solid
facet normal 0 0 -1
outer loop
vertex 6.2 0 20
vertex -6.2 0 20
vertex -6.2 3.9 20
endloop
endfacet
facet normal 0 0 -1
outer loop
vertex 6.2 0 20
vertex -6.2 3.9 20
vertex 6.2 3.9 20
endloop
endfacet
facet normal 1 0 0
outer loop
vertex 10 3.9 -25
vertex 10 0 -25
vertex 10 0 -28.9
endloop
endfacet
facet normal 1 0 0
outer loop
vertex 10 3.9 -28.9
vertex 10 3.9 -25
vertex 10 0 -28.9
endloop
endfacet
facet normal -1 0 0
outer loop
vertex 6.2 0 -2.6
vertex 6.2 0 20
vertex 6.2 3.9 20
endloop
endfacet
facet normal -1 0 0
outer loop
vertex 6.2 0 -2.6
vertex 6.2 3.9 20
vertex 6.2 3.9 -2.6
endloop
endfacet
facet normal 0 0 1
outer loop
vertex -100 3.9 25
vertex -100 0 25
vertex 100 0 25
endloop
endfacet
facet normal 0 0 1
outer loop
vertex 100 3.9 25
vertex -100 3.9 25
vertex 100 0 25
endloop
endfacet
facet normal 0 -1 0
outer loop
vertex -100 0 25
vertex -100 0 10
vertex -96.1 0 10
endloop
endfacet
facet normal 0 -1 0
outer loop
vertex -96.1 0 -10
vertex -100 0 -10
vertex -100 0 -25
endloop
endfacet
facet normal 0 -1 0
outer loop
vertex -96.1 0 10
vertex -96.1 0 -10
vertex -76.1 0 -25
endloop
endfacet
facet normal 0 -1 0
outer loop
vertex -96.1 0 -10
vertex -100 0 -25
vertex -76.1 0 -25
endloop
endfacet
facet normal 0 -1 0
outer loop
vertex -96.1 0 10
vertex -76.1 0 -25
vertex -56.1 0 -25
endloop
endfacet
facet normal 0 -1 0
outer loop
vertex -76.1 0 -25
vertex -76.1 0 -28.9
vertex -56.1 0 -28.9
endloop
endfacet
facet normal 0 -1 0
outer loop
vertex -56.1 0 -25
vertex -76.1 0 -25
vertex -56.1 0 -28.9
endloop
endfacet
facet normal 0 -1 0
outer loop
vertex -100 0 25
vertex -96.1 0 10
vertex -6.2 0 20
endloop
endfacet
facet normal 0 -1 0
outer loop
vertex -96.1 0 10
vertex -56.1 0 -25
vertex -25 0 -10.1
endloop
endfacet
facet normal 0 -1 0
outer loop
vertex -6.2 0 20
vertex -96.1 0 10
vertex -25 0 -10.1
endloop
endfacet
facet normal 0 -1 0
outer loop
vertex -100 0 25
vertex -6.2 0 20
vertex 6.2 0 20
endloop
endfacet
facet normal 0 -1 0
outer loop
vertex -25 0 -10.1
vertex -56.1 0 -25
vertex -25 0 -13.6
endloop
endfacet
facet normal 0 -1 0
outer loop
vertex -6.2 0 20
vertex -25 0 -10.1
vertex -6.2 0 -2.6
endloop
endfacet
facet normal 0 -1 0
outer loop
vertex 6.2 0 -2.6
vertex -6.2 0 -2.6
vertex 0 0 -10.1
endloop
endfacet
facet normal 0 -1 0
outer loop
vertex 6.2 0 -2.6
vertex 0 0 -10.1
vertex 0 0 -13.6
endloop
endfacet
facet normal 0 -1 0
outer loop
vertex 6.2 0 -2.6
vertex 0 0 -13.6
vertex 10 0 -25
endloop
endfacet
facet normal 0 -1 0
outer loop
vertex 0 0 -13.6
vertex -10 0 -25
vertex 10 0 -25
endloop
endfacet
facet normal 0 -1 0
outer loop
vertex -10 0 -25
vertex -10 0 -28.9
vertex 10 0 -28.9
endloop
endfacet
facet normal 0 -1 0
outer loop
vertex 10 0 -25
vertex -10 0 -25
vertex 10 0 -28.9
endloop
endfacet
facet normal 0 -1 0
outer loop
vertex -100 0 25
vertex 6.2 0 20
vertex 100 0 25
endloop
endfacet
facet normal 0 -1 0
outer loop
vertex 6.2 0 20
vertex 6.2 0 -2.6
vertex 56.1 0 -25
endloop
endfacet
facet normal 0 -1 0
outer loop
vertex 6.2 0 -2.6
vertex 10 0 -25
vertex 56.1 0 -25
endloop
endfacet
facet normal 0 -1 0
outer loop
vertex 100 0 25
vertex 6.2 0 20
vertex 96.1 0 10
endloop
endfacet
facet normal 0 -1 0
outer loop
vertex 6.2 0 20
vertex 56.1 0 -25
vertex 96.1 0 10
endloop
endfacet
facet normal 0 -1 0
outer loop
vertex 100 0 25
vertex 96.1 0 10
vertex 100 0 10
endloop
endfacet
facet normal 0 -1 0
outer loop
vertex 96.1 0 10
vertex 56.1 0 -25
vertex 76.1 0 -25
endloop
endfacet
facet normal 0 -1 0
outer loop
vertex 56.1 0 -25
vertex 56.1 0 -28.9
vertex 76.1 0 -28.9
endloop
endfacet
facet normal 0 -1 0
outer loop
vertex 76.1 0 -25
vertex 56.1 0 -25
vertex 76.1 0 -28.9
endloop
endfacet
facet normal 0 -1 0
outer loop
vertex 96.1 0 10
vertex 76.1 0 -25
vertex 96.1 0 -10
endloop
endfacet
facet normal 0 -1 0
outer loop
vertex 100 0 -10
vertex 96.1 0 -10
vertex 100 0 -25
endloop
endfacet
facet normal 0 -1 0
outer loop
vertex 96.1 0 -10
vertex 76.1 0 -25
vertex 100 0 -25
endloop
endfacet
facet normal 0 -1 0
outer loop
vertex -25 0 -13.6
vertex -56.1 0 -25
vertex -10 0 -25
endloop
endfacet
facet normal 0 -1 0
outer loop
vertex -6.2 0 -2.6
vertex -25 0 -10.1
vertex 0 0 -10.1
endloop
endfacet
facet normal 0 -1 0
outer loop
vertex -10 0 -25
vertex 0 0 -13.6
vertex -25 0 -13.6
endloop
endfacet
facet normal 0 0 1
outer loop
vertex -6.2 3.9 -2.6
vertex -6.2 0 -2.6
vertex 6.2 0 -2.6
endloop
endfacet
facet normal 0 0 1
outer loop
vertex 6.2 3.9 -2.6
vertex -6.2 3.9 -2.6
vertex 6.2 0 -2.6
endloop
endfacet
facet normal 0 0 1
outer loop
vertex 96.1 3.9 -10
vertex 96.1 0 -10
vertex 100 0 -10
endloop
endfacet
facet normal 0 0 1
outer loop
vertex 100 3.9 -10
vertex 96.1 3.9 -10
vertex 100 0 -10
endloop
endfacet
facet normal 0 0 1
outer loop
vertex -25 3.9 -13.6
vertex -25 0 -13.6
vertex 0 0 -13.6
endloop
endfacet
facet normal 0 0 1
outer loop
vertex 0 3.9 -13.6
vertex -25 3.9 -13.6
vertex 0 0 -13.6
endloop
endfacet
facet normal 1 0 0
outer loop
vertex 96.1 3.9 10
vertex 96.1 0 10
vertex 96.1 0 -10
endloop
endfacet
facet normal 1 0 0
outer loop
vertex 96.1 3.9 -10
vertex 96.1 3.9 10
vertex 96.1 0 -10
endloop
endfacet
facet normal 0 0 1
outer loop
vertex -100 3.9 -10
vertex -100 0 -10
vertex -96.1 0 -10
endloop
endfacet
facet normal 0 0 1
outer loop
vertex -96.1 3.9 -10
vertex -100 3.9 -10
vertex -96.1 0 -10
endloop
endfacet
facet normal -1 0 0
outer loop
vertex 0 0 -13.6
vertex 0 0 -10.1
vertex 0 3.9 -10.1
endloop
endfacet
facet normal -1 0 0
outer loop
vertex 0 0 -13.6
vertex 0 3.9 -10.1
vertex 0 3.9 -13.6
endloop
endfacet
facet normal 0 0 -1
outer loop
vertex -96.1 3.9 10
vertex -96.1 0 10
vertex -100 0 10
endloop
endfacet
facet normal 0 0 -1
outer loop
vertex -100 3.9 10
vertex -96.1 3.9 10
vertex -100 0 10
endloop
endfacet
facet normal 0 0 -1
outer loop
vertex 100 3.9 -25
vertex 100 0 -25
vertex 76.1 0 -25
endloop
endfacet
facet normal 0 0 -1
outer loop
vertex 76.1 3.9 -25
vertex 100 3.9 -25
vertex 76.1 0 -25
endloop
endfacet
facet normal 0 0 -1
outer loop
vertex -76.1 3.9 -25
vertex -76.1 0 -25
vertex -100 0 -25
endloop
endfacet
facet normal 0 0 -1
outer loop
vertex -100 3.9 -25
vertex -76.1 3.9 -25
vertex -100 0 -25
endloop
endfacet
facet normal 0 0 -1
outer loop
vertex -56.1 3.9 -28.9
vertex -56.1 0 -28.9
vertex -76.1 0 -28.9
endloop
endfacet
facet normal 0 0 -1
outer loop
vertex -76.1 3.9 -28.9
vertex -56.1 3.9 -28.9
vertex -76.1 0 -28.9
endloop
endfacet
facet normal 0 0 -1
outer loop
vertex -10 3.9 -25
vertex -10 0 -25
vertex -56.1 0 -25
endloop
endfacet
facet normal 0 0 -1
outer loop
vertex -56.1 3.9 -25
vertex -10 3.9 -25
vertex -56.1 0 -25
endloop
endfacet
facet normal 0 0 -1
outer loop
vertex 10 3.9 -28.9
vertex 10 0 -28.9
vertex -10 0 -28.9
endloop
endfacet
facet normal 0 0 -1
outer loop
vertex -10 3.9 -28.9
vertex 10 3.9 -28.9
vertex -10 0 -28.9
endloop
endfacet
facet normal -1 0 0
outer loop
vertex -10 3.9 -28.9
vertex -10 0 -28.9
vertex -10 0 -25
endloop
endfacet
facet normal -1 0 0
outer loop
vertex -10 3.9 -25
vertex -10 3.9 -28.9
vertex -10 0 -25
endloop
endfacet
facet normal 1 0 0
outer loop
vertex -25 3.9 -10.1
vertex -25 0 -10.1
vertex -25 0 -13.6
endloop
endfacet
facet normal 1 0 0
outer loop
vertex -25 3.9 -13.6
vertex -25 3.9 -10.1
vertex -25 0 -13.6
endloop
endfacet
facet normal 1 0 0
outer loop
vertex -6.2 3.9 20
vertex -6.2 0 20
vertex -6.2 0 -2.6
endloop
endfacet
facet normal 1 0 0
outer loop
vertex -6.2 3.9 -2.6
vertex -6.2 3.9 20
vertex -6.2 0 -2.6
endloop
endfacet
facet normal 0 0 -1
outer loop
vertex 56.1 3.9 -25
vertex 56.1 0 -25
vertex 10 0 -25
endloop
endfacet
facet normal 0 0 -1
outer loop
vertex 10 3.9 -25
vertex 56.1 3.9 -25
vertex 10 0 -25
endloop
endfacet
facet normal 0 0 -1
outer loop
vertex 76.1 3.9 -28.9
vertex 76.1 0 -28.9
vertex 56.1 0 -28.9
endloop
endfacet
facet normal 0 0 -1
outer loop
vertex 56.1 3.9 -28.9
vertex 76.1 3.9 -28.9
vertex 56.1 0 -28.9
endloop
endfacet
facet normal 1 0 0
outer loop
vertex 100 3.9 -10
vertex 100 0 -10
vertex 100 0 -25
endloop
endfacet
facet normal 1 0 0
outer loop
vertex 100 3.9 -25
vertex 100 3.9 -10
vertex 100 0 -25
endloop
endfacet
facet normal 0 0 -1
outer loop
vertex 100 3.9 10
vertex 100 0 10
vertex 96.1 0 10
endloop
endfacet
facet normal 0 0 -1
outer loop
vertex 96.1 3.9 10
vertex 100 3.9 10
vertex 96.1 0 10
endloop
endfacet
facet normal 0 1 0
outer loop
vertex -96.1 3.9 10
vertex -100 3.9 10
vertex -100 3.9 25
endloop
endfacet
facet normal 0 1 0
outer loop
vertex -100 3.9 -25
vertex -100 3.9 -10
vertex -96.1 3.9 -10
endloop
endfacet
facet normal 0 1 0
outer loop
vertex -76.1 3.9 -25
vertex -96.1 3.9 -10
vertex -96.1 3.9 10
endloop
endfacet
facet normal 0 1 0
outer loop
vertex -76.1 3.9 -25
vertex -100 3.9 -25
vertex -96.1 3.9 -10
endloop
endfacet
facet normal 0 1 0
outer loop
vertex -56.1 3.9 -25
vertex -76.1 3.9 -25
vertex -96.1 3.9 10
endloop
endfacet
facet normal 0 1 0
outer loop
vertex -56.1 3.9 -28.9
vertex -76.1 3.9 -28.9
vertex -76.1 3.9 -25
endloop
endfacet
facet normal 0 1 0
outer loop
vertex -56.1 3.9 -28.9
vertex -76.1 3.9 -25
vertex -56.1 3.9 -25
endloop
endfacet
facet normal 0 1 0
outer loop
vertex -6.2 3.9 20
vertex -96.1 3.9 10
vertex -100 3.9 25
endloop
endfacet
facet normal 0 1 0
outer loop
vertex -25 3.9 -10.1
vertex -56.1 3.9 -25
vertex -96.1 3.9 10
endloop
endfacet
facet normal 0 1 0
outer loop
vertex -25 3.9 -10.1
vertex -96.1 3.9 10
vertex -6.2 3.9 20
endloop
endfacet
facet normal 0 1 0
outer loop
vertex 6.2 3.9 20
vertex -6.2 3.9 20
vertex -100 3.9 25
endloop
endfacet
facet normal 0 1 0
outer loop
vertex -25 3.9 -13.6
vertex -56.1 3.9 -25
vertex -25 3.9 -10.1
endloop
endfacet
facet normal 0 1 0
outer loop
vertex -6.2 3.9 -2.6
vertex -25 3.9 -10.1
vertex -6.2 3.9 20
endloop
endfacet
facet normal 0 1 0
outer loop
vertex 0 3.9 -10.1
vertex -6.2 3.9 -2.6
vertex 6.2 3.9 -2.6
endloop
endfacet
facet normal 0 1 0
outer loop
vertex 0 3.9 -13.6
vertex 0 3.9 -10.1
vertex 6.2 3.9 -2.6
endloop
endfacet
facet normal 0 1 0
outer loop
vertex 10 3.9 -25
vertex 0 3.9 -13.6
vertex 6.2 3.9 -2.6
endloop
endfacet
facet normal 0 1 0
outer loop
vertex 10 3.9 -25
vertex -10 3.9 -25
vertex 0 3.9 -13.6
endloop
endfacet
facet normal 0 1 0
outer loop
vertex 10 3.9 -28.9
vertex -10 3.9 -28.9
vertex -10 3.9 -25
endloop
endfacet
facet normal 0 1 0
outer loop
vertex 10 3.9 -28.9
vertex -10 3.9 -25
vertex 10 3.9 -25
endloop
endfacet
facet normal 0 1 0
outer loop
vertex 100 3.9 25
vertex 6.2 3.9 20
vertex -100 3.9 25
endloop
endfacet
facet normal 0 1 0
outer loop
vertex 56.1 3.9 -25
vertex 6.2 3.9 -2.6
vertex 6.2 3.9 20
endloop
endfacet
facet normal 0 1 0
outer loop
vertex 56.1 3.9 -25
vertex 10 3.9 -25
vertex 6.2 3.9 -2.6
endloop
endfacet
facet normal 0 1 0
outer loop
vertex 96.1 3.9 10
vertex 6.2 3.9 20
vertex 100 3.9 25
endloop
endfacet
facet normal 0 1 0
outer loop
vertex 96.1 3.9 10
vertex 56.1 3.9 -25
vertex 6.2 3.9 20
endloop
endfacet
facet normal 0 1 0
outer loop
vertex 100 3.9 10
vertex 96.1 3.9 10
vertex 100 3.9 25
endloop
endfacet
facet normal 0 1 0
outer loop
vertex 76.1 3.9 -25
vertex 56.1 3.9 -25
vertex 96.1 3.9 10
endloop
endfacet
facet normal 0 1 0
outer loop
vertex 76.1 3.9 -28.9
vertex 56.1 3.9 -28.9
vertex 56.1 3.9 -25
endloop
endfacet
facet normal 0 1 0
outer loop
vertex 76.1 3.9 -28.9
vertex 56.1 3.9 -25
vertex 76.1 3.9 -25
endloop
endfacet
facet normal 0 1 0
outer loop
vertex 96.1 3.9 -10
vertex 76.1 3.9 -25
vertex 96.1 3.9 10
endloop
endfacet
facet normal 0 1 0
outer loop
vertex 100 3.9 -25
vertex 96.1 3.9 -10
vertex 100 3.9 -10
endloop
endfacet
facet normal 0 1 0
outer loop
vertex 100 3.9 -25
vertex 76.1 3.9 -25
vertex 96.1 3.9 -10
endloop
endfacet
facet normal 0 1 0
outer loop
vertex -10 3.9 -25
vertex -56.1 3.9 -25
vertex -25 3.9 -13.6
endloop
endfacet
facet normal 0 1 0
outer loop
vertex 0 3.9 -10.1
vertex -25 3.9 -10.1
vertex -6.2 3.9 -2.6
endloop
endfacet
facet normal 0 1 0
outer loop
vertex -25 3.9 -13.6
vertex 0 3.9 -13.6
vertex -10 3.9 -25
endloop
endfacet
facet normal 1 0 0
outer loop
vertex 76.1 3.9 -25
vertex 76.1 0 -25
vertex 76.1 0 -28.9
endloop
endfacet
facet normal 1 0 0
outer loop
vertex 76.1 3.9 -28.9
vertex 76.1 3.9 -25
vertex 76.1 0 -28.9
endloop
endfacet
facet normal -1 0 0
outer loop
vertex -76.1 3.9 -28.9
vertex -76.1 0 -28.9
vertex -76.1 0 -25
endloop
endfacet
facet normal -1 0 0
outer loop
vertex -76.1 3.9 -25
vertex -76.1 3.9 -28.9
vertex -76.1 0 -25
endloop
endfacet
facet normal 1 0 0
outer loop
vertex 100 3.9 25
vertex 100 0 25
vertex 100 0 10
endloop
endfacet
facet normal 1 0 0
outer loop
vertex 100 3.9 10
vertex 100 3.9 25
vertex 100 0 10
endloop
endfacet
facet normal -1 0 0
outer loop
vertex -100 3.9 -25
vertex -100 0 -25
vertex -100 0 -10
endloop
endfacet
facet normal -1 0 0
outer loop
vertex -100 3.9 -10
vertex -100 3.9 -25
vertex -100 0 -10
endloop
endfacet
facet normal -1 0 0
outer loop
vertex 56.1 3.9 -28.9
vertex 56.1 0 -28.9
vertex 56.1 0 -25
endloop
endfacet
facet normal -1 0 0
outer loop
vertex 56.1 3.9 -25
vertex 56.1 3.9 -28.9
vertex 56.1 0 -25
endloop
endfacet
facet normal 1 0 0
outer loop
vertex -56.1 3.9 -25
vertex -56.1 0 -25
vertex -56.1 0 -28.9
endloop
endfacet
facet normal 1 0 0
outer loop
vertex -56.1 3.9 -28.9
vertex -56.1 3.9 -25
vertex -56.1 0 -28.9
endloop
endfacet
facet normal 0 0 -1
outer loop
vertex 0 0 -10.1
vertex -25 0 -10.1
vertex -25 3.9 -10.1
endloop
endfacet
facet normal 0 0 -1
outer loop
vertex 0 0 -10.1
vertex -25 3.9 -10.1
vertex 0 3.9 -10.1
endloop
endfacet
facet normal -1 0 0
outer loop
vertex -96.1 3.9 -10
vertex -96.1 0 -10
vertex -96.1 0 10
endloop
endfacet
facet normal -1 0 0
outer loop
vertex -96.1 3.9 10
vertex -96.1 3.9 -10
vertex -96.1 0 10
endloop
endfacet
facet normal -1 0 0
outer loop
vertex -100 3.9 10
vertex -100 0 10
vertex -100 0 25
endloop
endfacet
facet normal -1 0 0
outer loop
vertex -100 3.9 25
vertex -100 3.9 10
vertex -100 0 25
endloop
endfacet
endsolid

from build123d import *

# Parameters (mm, degrees)
SKETCH1_W           = 25
SKETCH1_H           = 3.5
BOSS_EXTRUDE1_DEPTH = 3.9
SKETCH1_3_W         = 12.4
SKETCH1_3_H         = 22.6
CUT_EXTRUDE3_DEPTH  = 4.9


with BuildPart() as part:
    # Sketch1 → Boss-Extrude1 (new body)
    with BuildSketch(Plane(origin=(0, 0, 0), x_dir=(1, 0, 0), z_dir=(0, 1, 0))):
        Polygon((-76.1, 25), (-100, 25), (-100, 10), (-96.1, 10), (-96.1, -10), (-100, -10), (-100, -25), (100, -25), (100, -10), (96.1, -10), (96.1, 10), (100, 10), (100, 25), (76.1, 25), (76.1, 28.9), (56.1, 28.9), (56.1, 25), (10, 25), (10, 28.9), (-10, 28.9), (-10, 25), (-56.1, 25), (-56.1, 28.9), (-76.1, 28.9), align=None)
        with Locations((-12.5, 11.85)):
            Rectangle(SKETCH1_W, SKETCH1_H, mode=Mode.SUBTRACT)
    extrude(amount=BOSS_EXTRUDE1_DEPTH)

    # Sketch1<3> → Cut-Extrude3 (cut, through all)
    with BuildSketch(Plane(origin=(0, 0, 0), x_dir=(1, 0, 0), z_dir=(0, 1, 0))):
        with Locations((0, -8.7)):
            Rectangle(SKETCH1_3_W, SKETCH1_3_H)
    extrude(amount=CUT_EXTRUDE3_DEPTH, mode=Mode.SUBTRACT)


solid = part.part
